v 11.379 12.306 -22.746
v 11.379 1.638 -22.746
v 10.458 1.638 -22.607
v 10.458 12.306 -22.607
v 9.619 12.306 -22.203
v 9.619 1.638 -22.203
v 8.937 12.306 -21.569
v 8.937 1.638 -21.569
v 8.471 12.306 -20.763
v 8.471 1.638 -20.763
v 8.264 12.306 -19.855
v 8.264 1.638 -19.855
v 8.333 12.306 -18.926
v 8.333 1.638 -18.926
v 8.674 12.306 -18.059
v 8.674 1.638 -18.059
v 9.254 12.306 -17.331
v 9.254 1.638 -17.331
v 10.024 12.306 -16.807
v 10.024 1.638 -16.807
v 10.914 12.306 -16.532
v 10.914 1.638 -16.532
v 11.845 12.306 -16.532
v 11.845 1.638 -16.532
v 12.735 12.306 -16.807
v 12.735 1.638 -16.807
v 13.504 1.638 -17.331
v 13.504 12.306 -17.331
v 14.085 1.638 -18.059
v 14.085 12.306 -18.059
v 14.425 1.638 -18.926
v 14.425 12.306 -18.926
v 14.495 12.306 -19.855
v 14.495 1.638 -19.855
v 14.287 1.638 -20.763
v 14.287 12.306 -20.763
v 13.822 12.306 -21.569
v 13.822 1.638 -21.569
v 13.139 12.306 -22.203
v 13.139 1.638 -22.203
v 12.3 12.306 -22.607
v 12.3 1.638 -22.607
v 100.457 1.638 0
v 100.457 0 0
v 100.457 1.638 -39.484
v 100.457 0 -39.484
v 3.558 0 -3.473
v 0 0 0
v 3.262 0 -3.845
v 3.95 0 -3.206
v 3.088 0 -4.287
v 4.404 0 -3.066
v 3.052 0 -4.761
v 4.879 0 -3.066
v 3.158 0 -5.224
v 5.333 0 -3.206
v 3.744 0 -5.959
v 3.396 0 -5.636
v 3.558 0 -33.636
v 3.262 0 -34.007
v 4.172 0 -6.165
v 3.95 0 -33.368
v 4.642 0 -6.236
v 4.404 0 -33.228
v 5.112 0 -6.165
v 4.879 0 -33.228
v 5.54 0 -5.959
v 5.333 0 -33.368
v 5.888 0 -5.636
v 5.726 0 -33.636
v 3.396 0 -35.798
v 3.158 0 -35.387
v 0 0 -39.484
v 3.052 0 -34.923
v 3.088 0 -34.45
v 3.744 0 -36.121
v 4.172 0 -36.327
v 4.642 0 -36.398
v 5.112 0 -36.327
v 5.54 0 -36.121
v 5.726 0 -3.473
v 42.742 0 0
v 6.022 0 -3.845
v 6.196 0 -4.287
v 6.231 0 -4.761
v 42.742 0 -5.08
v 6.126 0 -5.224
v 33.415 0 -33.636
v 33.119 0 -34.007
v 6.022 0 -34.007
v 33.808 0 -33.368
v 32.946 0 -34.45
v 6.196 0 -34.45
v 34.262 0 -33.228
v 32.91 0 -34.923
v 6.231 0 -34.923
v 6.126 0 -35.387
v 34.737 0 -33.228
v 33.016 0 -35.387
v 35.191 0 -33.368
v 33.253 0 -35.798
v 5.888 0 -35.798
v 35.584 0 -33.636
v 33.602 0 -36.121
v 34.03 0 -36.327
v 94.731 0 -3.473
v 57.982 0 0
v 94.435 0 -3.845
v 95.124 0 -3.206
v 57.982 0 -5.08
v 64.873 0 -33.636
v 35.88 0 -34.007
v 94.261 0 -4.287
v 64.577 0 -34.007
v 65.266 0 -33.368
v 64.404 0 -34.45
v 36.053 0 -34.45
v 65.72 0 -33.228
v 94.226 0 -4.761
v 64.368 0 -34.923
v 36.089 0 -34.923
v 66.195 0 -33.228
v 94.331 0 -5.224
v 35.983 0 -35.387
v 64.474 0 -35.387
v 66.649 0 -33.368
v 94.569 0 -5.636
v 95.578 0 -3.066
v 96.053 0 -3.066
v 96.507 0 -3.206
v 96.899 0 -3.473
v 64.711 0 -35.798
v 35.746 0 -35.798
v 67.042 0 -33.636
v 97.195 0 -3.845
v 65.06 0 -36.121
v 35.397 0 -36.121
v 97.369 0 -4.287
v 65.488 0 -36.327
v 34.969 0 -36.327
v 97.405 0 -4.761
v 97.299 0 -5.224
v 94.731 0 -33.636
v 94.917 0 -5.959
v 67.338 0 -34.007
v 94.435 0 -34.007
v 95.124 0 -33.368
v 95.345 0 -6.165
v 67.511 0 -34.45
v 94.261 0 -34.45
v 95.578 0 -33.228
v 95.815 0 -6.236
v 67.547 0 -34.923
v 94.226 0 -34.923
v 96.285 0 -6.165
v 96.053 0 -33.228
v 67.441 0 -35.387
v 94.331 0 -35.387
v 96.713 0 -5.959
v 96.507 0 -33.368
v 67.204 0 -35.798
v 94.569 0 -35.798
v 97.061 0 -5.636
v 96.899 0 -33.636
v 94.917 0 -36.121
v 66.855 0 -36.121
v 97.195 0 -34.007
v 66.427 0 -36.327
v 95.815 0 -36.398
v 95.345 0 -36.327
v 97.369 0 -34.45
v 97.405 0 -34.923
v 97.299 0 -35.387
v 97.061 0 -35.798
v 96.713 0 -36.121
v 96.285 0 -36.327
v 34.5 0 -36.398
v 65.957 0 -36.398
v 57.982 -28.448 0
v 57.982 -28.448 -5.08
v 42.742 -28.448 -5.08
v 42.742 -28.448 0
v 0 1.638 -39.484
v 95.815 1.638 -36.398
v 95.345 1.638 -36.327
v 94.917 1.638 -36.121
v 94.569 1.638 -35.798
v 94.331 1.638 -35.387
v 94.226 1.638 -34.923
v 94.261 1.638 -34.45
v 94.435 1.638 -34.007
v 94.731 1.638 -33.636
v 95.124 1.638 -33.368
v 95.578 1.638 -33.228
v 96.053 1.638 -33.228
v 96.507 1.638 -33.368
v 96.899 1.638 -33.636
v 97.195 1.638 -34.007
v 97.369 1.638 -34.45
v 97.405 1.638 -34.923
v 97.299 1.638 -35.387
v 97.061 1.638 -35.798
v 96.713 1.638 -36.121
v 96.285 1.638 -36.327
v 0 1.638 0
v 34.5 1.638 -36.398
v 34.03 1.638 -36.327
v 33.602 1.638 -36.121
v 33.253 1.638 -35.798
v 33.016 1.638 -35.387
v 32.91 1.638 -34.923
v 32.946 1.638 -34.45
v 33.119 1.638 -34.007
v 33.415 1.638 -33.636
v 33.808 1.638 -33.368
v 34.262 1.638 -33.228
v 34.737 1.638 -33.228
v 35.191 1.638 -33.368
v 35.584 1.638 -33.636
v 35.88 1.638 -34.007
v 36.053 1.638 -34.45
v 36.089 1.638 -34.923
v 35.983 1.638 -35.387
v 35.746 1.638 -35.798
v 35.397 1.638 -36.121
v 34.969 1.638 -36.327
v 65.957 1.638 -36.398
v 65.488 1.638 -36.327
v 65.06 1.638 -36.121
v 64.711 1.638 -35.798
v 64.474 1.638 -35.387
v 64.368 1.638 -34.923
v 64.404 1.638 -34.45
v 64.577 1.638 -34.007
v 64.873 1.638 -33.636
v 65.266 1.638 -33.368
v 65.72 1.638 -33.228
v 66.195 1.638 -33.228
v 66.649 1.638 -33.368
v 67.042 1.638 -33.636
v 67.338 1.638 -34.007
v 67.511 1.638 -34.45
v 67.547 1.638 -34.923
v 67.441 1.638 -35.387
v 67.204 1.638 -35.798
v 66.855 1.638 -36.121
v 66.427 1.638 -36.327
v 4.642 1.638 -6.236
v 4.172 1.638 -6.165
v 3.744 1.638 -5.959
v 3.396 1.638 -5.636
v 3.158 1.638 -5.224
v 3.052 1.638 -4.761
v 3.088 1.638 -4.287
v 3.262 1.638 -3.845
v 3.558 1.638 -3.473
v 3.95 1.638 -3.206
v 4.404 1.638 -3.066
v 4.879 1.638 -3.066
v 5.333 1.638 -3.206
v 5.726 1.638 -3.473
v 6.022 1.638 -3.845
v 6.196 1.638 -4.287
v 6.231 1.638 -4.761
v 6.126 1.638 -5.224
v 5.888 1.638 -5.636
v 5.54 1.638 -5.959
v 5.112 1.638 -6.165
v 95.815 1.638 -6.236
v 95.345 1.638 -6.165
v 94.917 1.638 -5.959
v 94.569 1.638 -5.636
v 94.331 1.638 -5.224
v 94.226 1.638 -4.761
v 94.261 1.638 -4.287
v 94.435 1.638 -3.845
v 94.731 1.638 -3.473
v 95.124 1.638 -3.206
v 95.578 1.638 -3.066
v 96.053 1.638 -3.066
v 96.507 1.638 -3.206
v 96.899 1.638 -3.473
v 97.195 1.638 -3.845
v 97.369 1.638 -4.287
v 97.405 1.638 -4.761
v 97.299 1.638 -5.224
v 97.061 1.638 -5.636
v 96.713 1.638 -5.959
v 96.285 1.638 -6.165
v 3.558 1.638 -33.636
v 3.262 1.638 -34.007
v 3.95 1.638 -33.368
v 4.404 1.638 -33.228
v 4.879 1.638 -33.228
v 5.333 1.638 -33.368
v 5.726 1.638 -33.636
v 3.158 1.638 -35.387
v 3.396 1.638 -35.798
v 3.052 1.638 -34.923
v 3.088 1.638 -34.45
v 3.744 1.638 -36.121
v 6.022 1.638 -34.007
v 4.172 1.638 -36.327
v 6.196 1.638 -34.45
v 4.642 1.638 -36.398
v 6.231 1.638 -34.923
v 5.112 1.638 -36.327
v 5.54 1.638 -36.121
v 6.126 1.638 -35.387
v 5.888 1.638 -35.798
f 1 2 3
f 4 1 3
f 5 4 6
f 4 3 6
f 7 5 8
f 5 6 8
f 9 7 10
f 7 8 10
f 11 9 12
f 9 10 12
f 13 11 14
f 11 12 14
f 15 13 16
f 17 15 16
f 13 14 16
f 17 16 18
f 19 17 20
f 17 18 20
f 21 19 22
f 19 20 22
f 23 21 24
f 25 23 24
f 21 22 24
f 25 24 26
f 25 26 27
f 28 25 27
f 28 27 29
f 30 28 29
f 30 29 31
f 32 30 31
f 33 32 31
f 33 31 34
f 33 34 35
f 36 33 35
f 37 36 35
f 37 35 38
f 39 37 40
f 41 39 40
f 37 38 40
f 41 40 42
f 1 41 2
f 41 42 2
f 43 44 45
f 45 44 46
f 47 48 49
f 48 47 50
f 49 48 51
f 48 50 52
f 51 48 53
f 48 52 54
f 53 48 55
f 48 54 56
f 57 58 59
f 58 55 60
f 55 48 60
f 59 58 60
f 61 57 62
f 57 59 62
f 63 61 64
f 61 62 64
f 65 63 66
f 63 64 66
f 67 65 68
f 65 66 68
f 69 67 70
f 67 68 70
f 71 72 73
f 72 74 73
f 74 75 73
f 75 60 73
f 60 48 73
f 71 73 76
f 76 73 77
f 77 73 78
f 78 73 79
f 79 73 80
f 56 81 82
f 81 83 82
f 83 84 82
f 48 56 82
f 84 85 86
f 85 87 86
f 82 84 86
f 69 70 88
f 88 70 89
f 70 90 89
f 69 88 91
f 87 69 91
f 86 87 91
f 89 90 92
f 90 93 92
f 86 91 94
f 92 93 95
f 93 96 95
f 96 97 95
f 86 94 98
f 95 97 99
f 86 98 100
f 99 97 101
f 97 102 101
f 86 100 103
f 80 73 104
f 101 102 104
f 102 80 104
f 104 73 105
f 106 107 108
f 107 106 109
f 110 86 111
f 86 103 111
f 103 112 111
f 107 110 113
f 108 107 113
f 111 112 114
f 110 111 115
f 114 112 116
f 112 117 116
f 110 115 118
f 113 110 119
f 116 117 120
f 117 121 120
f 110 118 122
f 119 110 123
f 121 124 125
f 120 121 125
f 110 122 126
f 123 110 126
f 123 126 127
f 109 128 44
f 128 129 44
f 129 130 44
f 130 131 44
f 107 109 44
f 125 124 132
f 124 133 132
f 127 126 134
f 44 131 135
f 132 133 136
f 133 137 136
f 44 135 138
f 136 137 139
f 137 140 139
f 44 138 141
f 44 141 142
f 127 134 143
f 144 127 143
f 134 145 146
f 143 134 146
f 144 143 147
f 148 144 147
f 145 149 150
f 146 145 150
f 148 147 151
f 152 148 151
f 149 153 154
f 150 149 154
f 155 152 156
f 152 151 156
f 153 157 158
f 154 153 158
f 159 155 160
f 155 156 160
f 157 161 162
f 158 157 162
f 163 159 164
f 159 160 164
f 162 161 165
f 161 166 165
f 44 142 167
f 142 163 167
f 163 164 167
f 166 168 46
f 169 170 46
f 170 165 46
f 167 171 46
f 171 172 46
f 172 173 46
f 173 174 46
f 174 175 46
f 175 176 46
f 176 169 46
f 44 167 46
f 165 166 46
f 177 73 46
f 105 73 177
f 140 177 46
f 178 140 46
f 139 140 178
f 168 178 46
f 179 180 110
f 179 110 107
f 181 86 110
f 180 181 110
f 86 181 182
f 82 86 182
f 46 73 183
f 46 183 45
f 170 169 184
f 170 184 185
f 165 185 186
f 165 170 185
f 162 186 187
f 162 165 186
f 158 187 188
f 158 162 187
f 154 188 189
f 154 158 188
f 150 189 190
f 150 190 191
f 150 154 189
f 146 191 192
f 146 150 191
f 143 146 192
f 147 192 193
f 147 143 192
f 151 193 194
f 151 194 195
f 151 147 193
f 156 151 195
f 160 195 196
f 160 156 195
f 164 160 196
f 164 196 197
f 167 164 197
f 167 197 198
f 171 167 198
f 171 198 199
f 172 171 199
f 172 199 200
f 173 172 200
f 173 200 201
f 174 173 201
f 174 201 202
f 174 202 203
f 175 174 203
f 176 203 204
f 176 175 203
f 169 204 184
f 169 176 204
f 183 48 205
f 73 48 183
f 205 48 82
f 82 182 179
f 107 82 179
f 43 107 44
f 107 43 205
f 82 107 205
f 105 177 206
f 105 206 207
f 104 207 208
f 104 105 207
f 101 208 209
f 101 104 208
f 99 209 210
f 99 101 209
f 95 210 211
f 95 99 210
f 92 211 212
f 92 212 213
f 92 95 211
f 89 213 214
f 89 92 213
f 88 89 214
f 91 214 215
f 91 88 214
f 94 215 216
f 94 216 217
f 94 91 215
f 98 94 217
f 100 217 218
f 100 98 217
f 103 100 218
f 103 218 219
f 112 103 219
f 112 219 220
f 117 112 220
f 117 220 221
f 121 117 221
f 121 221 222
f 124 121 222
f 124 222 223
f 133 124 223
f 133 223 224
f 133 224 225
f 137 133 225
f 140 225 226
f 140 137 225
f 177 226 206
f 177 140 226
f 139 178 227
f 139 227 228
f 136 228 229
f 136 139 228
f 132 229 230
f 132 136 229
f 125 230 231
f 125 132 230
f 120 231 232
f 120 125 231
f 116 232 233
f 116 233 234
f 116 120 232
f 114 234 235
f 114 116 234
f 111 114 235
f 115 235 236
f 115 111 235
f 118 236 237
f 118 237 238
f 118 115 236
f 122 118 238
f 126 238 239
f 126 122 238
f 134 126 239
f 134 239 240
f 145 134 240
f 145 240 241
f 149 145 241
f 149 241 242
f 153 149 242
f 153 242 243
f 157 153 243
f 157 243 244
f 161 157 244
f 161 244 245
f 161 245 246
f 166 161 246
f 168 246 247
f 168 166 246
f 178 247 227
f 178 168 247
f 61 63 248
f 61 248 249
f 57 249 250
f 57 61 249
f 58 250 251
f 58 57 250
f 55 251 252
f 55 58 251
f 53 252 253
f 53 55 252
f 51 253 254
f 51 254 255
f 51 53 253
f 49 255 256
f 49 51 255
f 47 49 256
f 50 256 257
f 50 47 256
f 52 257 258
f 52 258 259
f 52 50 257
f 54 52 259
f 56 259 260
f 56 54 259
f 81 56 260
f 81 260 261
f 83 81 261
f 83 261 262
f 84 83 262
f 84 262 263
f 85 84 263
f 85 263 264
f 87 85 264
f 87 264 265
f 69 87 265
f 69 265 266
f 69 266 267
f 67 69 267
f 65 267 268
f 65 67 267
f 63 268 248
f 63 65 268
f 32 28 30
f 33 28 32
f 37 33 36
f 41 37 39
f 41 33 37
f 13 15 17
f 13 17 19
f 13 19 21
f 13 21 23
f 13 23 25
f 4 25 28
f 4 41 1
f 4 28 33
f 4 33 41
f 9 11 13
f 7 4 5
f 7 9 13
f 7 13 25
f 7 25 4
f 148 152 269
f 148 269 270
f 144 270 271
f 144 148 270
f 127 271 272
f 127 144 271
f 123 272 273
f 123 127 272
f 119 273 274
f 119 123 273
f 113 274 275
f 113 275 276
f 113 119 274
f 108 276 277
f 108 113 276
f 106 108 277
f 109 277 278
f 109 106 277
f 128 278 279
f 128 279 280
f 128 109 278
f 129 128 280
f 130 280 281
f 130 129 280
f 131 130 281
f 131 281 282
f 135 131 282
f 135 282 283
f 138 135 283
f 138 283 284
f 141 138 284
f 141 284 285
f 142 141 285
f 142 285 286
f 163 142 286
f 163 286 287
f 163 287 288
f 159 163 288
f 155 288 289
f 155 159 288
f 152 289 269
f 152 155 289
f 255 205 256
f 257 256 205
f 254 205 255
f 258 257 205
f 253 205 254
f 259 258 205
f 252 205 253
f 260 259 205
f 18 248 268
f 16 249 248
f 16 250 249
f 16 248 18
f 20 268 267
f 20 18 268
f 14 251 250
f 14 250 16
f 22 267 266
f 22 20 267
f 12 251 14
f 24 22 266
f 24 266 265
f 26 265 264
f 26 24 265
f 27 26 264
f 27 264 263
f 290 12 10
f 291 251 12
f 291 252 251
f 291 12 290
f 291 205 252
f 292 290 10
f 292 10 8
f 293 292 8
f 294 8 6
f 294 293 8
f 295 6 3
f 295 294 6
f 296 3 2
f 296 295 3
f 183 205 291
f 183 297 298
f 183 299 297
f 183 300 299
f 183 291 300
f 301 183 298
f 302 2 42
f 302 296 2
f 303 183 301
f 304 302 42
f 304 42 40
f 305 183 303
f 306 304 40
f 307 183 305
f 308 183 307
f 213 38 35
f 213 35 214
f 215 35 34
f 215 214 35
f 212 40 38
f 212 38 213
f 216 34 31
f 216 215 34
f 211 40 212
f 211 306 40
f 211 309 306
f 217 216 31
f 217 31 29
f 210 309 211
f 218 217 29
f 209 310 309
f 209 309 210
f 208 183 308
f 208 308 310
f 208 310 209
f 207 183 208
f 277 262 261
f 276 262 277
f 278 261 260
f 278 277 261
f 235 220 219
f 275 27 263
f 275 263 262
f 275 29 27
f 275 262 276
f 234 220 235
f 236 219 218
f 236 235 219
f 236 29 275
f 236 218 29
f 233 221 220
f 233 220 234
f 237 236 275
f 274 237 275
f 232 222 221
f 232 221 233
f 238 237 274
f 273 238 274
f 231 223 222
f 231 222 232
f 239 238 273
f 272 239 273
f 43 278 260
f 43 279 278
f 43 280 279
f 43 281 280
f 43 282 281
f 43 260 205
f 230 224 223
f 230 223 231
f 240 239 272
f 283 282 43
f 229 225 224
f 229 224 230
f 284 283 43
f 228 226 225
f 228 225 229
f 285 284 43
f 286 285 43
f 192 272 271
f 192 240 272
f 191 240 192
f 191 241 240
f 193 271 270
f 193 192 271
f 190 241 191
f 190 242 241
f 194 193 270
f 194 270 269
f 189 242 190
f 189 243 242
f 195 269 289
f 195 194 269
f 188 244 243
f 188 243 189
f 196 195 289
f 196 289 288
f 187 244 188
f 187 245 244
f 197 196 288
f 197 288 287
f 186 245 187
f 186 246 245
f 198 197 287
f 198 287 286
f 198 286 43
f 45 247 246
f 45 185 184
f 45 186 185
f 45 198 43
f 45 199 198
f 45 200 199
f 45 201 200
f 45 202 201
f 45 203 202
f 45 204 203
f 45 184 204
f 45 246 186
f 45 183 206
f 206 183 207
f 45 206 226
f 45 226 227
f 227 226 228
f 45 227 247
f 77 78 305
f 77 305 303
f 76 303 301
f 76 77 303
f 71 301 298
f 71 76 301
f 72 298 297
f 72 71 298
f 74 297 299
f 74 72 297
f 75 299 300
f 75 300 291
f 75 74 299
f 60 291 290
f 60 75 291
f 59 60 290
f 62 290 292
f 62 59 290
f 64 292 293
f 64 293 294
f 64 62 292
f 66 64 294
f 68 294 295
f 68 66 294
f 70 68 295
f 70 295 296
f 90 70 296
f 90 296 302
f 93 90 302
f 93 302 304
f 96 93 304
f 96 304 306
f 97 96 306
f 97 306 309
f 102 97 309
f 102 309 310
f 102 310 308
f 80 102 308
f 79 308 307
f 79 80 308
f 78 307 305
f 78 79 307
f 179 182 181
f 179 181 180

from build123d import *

# Parameters (mm, degrees)
SKETCH1_W           = 100.457
SKETCH1_H           = 39.4843
SKETCH1_R           = 1.59385
BOSS_EXTRUDE1_DEPTH = 1.6383
SKETCH3_R           = 3.1242
BOSS_EXTRUDE2_DEPTH = 10.668
SKETCH4_W           = 15.24
SKETCH4_H           = 5.08
BOSS_EXTRUDE3_DEPTH = 28.448


with BuildPart() as part:
    # Sketch1 → Boss-Extrude1 (new body)
    with BuildSketch(Plane(origin=(0, 0, 0), x_dir=(1, 0, 0), z_dir=(0, 1, 0))):
        with Locations((50.2285, 19.74215)):
            Rectangle(SKETCH1_W, SKETCH1_H)
        with Locations(Location((4.64185, 34.80435, 0), (0, 0, 90))):
            Circle(SKETCH1_R, mode=Mode.SUBTRACT)
        with Locations(Location((34.49955, 34.80435, 0), (0, 0, 90))):
            Circle(SKETCH1_R, mode=Mode.SUBTRACT)
        with Locations(Location((4.64185, 4.64185, 0), (0, 0, 90))):
            Circle(SKETCH1_R, mode=Mode.SUBTRACT)
        with Locations(Location((65.95745, 34.80435, 0), (0, 0, 90))):
            Circle(SKETCH1_R, mode=Mode.SUBTRACT)
        with Locations(Location((95.81515, 34.80435, 0), (0, 0, 90))):
            Circle(SKETCH1_R, mode=Mode.SUBTRACT)
        with Locations(Location((95.81515, 4.64185, 0), (0, 0, 90))):
            Circle(SKETCH1_R, mode=Mode.SUBTRACT)
    extrude(amount=BOSS_EXTRUDE1_DEPTH)

    # Sketch3 → Boss-Extrude2 (add)
    with BuildSketch(Plane(origin=(0, 1.6383, 0), x_dir=(1, 0, 0), z_dir=(0, 1, 0))):
        with Locations(Location((11.3792, 19.6215, 0), (0, 0, 90))):
            Circle(SKETCH3_R)
    extrude(amount=BOSS_EXTRUDE2_DEPTH)

    # Sketch4 → Boss-Extrude3 (add)
    with BuildSketch(Plane.XZ):
        with Locations((50.36185, -2.54)):
            Rectangle(SKETCH4_W, SKETCH4_H)
    extrude(amount=BOSS_EXTRUDE3_DEPTH)


solid = part.part
